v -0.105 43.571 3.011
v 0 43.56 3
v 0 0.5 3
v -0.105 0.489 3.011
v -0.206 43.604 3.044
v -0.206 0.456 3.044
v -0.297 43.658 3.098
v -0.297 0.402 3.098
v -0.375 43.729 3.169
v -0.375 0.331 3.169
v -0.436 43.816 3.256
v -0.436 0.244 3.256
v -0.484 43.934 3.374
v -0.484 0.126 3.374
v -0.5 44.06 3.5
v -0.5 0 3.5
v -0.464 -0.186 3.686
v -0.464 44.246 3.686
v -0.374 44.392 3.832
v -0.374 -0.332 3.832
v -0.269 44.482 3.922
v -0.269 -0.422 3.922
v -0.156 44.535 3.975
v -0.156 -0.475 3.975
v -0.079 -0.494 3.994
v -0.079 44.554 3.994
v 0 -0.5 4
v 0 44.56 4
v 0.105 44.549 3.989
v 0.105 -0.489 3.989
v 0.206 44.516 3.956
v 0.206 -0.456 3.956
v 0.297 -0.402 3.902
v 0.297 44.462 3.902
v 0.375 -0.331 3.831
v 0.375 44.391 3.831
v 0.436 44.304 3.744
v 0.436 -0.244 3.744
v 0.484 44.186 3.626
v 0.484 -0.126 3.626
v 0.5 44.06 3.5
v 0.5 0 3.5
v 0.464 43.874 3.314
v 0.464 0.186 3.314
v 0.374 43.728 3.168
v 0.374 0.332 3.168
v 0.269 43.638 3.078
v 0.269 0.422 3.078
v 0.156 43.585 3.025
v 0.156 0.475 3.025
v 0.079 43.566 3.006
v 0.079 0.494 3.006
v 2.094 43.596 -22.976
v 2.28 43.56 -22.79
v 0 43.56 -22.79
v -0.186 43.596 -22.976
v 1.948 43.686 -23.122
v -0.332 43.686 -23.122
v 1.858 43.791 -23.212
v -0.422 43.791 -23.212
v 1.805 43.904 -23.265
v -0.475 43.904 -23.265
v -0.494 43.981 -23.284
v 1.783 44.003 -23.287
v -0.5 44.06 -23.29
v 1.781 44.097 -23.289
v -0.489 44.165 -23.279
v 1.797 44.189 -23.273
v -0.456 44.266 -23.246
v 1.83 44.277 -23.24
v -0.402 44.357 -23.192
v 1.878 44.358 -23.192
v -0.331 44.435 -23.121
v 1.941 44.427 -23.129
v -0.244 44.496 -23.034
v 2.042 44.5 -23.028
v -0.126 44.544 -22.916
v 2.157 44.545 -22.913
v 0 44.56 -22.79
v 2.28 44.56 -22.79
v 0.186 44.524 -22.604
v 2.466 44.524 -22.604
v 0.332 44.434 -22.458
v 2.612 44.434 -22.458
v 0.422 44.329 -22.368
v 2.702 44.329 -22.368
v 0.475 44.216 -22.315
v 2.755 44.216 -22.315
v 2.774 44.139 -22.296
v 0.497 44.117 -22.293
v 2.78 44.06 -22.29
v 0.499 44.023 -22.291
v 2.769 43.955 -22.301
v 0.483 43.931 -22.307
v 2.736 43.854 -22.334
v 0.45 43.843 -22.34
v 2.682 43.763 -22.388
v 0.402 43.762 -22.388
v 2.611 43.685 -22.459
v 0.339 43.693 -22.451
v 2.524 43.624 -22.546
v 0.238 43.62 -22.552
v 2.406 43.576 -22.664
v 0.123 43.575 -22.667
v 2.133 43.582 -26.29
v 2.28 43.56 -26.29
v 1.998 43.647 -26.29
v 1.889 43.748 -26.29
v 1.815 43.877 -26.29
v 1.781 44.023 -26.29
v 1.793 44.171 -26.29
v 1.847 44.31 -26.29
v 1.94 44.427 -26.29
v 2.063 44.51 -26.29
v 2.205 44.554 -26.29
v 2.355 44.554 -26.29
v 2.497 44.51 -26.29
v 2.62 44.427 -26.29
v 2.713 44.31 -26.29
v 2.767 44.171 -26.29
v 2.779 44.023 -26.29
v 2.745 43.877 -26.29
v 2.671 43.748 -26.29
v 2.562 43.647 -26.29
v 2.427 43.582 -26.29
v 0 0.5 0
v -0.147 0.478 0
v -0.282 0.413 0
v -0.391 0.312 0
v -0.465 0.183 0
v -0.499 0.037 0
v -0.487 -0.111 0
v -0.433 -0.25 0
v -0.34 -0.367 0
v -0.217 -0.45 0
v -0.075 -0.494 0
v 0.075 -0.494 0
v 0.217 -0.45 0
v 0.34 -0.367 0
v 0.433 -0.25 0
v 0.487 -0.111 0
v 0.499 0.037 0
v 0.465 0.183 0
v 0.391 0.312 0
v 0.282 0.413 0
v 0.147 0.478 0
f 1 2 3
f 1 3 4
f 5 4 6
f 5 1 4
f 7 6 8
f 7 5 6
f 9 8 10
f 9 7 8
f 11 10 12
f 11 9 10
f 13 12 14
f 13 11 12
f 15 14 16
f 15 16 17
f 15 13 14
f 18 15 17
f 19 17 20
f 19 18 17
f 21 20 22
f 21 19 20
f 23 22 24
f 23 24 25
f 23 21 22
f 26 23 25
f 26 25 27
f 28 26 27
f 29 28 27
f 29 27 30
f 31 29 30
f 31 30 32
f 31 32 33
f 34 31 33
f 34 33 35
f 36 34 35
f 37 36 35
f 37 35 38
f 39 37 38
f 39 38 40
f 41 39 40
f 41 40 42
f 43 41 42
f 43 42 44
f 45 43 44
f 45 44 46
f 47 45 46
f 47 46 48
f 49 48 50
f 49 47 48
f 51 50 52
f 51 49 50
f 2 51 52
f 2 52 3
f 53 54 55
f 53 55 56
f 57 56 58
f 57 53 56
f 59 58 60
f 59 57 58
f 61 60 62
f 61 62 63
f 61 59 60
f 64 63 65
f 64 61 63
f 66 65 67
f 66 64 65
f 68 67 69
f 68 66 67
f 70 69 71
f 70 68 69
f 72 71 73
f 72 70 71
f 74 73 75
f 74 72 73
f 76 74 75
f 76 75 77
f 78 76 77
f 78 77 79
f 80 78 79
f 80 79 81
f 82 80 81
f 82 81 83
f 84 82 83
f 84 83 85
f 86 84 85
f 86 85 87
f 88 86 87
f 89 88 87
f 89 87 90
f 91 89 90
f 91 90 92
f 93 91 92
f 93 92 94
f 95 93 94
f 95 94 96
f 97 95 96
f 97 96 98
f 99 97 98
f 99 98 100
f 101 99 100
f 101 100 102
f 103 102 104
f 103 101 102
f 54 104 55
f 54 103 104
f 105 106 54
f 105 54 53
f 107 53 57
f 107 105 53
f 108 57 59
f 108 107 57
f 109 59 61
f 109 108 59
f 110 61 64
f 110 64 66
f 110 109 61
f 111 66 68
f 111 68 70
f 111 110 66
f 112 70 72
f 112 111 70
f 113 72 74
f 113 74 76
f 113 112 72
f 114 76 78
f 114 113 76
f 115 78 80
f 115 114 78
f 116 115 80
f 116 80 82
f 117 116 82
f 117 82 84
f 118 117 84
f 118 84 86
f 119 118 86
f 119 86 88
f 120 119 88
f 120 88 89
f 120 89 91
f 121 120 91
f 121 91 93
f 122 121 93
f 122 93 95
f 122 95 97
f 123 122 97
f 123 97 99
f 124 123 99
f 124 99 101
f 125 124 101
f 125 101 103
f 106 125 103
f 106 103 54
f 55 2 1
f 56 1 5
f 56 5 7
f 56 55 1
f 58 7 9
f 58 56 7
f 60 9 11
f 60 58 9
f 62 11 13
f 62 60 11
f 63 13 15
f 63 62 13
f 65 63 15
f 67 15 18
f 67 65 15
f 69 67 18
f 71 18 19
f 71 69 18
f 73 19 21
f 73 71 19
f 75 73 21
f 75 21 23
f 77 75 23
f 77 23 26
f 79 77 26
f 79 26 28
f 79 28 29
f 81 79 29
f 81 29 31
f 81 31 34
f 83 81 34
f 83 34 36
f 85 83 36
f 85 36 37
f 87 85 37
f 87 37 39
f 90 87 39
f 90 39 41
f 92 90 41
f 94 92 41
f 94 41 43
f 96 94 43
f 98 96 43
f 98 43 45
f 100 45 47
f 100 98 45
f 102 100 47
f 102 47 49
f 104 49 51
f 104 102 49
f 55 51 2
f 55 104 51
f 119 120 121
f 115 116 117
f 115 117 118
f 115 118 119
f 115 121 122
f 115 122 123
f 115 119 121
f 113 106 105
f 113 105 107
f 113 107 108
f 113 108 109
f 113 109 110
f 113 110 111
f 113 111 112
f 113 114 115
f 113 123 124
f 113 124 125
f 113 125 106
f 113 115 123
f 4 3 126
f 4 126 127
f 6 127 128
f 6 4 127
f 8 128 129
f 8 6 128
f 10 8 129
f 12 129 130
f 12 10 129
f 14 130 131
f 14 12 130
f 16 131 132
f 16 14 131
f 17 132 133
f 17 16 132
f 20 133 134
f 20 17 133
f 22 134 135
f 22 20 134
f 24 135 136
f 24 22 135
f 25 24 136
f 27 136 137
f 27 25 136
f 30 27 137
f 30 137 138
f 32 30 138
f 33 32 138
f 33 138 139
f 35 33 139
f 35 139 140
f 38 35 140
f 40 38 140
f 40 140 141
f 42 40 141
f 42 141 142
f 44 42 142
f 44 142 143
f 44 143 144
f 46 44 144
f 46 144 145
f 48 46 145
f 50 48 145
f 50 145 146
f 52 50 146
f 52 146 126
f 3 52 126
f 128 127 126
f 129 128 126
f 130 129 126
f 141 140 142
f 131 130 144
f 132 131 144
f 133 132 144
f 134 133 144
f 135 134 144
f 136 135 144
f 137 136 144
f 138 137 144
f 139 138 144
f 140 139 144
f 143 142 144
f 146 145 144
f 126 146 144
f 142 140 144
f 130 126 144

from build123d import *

# Parameters (mm, degrees)
ESQUISSE1_R = 0.5


with BuildPart() as part:
    # Balayage1: sweep along a curve in space
    with BuildLine() as balayage1_path:
        Line((0, 0, 0), (0, 0, 3.5))
        Line((0, 0, 3.5), (0, 44.06, 3.5))
        Line((0, 44.06, 3.5), (0, 44.06, -22.79))
        Line((0, 44.06, -22.79), (2.28, 44.06, -22.79))
        Line((2.28, 44.06, -22.79), (2.28, 44.06, -26.29))
    # Esquisse1 → Balayage1 (sweep)
    with BuildSketch(Plane(origin=(0, 0, 0), x_dir=(0, 1, 0), z_dir=(0, 0, 1))):
        Circle(ESQUISSE1_R)
    sweep(path=balayage1_path.line, transition=Transition.RIGHT)


solid = part.part
